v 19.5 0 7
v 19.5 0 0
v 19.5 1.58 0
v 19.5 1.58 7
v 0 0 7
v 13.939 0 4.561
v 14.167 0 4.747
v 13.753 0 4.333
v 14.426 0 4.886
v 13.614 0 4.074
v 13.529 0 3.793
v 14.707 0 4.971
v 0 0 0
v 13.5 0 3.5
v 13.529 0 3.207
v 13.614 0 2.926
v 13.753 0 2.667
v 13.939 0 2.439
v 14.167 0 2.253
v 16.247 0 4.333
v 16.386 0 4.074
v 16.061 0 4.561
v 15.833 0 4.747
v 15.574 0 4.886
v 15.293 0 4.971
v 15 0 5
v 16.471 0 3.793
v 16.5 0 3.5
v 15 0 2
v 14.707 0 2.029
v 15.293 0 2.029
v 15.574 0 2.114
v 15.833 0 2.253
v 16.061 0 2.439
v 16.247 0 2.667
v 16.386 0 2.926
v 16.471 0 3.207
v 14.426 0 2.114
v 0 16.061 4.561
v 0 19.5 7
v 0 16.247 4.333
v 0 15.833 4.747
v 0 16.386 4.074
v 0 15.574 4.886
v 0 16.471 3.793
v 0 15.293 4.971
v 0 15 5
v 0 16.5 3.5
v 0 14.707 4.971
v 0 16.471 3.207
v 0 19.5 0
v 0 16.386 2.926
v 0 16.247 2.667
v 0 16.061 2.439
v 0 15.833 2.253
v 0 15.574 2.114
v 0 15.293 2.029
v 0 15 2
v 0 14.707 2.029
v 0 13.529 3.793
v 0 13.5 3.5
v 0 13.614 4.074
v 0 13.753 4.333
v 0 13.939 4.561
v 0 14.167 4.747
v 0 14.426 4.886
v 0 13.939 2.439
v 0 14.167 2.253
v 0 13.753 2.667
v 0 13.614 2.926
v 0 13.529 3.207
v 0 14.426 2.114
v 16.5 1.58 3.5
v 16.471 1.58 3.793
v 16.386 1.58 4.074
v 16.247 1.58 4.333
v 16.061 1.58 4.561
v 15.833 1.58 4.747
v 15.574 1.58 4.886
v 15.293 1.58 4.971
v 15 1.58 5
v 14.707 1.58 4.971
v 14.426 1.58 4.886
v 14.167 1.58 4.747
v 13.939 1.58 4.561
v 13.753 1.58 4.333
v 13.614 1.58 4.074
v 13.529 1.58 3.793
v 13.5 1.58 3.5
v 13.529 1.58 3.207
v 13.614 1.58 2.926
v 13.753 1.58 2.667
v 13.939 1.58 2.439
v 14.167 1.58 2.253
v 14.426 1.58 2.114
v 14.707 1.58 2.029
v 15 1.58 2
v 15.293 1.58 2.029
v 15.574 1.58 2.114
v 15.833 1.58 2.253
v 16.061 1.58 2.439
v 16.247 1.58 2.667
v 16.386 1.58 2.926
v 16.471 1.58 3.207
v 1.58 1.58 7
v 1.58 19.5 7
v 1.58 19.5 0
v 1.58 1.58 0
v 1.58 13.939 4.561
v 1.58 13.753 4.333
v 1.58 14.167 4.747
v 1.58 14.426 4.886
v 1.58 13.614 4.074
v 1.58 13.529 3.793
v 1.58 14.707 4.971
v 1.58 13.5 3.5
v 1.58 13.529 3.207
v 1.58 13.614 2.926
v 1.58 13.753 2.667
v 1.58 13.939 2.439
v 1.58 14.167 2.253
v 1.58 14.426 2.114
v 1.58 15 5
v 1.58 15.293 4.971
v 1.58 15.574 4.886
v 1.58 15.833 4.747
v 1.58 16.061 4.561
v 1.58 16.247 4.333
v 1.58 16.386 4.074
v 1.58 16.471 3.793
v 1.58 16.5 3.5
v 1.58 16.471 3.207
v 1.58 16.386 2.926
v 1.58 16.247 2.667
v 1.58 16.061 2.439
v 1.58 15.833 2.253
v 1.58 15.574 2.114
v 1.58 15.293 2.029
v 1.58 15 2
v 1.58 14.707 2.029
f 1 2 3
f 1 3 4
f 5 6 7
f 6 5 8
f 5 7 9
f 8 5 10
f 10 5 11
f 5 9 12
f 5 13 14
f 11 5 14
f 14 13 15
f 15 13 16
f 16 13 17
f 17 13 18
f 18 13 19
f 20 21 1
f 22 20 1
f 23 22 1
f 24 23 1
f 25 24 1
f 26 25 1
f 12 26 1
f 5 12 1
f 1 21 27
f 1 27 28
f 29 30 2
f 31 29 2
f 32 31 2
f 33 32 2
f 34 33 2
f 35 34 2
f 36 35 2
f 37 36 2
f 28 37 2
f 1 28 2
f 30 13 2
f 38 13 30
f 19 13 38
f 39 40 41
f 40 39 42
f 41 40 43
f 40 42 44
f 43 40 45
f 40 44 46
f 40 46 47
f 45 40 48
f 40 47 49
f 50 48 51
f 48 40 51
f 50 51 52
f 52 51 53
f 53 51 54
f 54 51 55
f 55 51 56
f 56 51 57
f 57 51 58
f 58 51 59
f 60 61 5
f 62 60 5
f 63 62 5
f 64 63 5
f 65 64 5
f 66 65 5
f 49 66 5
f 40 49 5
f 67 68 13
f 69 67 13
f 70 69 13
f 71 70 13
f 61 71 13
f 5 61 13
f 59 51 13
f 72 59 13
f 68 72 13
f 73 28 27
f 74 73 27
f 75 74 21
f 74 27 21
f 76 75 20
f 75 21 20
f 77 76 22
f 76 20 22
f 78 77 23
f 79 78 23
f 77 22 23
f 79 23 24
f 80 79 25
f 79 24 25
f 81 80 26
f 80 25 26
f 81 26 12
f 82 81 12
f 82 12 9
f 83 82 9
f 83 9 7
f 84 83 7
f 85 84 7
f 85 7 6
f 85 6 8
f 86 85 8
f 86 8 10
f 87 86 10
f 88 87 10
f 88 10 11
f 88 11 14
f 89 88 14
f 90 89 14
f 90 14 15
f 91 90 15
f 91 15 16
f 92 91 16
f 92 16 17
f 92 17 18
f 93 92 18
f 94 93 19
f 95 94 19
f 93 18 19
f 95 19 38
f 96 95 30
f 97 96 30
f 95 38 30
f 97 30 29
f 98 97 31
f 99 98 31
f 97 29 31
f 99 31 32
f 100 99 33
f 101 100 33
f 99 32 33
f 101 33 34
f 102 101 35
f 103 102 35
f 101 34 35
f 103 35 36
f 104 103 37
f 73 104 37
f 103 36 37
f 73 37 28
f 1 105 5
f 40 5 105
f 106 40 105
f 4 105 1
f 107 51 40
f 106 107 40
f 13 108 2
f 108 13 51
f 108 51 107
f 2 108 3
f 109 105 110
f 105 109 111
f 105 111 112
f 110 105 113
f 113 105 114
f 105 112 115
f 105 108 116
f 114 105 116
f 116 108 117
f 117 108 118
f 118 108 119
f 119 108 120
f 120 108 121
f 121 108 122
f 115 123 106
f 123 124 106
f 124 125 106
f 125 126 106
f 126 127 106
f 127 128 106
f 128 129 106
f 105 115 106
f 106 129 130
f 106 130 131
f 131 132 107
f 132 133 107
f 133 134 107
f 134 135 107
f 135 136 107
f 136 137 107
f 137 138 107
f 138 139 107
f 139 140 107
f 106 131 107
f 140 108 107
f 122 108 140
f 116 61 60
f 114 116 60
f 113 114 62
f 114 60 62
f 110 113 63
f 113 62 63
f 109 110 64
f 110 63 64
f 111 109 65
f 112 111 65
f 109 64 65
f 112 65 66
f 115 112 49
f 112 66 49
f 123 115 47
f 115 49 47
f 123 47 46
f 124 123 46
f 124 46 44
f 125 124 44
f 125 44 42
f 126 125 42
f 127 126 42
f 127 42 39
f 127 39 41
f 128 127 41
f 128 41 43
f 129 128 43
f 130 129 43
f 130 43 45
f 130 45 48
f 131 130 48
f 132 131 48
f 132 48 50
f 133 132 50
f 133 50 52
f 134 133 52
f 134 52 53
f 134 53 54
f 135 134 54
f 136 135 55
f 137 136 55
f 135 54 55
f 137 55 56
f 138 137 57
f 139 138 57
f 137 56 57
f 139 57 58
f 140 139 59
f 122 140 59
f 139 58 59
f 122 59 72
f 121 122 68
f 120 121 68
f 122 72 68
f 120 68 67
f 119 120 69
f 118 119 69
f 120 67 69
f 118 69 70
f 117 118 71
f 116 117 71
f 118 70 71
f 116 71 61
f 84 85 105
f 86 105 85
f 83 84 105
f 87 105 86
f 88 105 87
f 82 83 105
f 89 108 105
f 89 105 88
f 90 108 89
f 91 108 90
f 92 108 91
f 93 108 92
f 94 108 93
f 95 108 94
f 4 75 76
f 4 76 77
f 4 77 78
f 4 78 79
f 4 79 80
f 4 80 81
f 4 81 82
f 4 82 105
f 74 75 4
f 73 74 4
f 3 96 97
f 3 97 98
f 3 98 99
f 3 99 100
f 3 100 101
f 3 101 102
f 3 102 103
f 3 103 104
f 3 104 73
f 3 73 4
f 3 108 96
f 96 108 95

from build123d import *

# Parameters (mm, degrees)
F0_W     = 23.84
F0_H     = 1.58
F1_DEPTH = 7
F2_R     = 1.5
F2_W     = 5.92
F2_H     = 7
F3_DEPTH = 25
F4_R     = 1.5
F4_W     = 5.92
F4_H     = 7
F5_DEPTH = 25


with BuildPart() as f1:
    # F0 (on Top) → F1 (new body)
    with BuildSketch(Plane.XY):
        Polygon((0, 25.42), (0, 0), (1.58, 0), (1.58, 1.58), (1.58, 25.42), align=None)
        with Locations((13.5, 0.79)):
            Rectangle(F0_W, F0_H)
    extrude(amount=F1_DEPTH)

    # F2 (on face) → F3 (cut)
    with BuildSketch(Plane(origin=(0, 0, 0), x_dir=(0, -1, 0), z_dir=(-1, 0, 0))):
        with Locations((-15, 3.5)):
            Circle(F2_R)
        with Locations((-22.46, 3.5)):
            Rectangle(F2_W, F2_H)
    extrude(amount=-F3_DEPTH, mode=Mode.SUBTRACT)

    # F4 (on face) → F5 (cut)
    with BuildSketch(Plane.XZ):
        with Locations((15, 3.5)):
            Circle(F4_R)
        with Locations((22.46, 3.5)):
            Rectangle(F4_W, F4_H)
    extrude(amount=-F5_DEPTH, mode=Mode.SUBTRACT)


solid = f1.part
